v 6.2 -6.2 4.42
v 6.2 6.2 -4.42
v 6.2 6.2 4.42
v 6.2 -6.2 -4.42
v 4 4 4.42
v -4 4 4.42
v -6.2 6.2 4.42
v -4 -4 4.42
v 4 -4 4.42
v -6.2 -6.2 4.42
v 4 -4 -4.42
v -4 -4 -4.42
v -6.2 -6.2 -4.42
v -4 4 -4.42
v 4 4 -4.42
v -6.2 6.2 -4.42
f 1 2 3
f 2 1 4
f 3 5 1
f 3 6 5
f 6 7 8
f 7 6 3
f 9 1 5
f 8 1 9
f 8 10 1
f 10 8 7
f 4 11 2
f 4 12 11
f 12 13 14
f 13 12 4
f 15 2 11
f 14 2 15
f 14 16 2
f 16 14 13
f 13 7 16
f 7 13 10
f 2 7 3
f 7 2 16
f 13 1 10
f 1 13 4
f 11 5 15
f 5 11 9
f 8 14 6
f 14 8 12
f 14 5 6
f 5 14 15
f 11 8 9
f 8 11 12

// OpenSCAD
//頂出鍵帽工具

GrooveSize=13.4;
GrooveSizeH=6.8;

difference() { 
    //主體
    translate([0,0,0]) 
        cube([GrooveSize-1,GrooveSize-1,GrooveSizeH*1.3],center=true); 
    
     translate([0,0,0]) 
        cube([8,8,GrooveSizeH*2],center=true);    
    }
